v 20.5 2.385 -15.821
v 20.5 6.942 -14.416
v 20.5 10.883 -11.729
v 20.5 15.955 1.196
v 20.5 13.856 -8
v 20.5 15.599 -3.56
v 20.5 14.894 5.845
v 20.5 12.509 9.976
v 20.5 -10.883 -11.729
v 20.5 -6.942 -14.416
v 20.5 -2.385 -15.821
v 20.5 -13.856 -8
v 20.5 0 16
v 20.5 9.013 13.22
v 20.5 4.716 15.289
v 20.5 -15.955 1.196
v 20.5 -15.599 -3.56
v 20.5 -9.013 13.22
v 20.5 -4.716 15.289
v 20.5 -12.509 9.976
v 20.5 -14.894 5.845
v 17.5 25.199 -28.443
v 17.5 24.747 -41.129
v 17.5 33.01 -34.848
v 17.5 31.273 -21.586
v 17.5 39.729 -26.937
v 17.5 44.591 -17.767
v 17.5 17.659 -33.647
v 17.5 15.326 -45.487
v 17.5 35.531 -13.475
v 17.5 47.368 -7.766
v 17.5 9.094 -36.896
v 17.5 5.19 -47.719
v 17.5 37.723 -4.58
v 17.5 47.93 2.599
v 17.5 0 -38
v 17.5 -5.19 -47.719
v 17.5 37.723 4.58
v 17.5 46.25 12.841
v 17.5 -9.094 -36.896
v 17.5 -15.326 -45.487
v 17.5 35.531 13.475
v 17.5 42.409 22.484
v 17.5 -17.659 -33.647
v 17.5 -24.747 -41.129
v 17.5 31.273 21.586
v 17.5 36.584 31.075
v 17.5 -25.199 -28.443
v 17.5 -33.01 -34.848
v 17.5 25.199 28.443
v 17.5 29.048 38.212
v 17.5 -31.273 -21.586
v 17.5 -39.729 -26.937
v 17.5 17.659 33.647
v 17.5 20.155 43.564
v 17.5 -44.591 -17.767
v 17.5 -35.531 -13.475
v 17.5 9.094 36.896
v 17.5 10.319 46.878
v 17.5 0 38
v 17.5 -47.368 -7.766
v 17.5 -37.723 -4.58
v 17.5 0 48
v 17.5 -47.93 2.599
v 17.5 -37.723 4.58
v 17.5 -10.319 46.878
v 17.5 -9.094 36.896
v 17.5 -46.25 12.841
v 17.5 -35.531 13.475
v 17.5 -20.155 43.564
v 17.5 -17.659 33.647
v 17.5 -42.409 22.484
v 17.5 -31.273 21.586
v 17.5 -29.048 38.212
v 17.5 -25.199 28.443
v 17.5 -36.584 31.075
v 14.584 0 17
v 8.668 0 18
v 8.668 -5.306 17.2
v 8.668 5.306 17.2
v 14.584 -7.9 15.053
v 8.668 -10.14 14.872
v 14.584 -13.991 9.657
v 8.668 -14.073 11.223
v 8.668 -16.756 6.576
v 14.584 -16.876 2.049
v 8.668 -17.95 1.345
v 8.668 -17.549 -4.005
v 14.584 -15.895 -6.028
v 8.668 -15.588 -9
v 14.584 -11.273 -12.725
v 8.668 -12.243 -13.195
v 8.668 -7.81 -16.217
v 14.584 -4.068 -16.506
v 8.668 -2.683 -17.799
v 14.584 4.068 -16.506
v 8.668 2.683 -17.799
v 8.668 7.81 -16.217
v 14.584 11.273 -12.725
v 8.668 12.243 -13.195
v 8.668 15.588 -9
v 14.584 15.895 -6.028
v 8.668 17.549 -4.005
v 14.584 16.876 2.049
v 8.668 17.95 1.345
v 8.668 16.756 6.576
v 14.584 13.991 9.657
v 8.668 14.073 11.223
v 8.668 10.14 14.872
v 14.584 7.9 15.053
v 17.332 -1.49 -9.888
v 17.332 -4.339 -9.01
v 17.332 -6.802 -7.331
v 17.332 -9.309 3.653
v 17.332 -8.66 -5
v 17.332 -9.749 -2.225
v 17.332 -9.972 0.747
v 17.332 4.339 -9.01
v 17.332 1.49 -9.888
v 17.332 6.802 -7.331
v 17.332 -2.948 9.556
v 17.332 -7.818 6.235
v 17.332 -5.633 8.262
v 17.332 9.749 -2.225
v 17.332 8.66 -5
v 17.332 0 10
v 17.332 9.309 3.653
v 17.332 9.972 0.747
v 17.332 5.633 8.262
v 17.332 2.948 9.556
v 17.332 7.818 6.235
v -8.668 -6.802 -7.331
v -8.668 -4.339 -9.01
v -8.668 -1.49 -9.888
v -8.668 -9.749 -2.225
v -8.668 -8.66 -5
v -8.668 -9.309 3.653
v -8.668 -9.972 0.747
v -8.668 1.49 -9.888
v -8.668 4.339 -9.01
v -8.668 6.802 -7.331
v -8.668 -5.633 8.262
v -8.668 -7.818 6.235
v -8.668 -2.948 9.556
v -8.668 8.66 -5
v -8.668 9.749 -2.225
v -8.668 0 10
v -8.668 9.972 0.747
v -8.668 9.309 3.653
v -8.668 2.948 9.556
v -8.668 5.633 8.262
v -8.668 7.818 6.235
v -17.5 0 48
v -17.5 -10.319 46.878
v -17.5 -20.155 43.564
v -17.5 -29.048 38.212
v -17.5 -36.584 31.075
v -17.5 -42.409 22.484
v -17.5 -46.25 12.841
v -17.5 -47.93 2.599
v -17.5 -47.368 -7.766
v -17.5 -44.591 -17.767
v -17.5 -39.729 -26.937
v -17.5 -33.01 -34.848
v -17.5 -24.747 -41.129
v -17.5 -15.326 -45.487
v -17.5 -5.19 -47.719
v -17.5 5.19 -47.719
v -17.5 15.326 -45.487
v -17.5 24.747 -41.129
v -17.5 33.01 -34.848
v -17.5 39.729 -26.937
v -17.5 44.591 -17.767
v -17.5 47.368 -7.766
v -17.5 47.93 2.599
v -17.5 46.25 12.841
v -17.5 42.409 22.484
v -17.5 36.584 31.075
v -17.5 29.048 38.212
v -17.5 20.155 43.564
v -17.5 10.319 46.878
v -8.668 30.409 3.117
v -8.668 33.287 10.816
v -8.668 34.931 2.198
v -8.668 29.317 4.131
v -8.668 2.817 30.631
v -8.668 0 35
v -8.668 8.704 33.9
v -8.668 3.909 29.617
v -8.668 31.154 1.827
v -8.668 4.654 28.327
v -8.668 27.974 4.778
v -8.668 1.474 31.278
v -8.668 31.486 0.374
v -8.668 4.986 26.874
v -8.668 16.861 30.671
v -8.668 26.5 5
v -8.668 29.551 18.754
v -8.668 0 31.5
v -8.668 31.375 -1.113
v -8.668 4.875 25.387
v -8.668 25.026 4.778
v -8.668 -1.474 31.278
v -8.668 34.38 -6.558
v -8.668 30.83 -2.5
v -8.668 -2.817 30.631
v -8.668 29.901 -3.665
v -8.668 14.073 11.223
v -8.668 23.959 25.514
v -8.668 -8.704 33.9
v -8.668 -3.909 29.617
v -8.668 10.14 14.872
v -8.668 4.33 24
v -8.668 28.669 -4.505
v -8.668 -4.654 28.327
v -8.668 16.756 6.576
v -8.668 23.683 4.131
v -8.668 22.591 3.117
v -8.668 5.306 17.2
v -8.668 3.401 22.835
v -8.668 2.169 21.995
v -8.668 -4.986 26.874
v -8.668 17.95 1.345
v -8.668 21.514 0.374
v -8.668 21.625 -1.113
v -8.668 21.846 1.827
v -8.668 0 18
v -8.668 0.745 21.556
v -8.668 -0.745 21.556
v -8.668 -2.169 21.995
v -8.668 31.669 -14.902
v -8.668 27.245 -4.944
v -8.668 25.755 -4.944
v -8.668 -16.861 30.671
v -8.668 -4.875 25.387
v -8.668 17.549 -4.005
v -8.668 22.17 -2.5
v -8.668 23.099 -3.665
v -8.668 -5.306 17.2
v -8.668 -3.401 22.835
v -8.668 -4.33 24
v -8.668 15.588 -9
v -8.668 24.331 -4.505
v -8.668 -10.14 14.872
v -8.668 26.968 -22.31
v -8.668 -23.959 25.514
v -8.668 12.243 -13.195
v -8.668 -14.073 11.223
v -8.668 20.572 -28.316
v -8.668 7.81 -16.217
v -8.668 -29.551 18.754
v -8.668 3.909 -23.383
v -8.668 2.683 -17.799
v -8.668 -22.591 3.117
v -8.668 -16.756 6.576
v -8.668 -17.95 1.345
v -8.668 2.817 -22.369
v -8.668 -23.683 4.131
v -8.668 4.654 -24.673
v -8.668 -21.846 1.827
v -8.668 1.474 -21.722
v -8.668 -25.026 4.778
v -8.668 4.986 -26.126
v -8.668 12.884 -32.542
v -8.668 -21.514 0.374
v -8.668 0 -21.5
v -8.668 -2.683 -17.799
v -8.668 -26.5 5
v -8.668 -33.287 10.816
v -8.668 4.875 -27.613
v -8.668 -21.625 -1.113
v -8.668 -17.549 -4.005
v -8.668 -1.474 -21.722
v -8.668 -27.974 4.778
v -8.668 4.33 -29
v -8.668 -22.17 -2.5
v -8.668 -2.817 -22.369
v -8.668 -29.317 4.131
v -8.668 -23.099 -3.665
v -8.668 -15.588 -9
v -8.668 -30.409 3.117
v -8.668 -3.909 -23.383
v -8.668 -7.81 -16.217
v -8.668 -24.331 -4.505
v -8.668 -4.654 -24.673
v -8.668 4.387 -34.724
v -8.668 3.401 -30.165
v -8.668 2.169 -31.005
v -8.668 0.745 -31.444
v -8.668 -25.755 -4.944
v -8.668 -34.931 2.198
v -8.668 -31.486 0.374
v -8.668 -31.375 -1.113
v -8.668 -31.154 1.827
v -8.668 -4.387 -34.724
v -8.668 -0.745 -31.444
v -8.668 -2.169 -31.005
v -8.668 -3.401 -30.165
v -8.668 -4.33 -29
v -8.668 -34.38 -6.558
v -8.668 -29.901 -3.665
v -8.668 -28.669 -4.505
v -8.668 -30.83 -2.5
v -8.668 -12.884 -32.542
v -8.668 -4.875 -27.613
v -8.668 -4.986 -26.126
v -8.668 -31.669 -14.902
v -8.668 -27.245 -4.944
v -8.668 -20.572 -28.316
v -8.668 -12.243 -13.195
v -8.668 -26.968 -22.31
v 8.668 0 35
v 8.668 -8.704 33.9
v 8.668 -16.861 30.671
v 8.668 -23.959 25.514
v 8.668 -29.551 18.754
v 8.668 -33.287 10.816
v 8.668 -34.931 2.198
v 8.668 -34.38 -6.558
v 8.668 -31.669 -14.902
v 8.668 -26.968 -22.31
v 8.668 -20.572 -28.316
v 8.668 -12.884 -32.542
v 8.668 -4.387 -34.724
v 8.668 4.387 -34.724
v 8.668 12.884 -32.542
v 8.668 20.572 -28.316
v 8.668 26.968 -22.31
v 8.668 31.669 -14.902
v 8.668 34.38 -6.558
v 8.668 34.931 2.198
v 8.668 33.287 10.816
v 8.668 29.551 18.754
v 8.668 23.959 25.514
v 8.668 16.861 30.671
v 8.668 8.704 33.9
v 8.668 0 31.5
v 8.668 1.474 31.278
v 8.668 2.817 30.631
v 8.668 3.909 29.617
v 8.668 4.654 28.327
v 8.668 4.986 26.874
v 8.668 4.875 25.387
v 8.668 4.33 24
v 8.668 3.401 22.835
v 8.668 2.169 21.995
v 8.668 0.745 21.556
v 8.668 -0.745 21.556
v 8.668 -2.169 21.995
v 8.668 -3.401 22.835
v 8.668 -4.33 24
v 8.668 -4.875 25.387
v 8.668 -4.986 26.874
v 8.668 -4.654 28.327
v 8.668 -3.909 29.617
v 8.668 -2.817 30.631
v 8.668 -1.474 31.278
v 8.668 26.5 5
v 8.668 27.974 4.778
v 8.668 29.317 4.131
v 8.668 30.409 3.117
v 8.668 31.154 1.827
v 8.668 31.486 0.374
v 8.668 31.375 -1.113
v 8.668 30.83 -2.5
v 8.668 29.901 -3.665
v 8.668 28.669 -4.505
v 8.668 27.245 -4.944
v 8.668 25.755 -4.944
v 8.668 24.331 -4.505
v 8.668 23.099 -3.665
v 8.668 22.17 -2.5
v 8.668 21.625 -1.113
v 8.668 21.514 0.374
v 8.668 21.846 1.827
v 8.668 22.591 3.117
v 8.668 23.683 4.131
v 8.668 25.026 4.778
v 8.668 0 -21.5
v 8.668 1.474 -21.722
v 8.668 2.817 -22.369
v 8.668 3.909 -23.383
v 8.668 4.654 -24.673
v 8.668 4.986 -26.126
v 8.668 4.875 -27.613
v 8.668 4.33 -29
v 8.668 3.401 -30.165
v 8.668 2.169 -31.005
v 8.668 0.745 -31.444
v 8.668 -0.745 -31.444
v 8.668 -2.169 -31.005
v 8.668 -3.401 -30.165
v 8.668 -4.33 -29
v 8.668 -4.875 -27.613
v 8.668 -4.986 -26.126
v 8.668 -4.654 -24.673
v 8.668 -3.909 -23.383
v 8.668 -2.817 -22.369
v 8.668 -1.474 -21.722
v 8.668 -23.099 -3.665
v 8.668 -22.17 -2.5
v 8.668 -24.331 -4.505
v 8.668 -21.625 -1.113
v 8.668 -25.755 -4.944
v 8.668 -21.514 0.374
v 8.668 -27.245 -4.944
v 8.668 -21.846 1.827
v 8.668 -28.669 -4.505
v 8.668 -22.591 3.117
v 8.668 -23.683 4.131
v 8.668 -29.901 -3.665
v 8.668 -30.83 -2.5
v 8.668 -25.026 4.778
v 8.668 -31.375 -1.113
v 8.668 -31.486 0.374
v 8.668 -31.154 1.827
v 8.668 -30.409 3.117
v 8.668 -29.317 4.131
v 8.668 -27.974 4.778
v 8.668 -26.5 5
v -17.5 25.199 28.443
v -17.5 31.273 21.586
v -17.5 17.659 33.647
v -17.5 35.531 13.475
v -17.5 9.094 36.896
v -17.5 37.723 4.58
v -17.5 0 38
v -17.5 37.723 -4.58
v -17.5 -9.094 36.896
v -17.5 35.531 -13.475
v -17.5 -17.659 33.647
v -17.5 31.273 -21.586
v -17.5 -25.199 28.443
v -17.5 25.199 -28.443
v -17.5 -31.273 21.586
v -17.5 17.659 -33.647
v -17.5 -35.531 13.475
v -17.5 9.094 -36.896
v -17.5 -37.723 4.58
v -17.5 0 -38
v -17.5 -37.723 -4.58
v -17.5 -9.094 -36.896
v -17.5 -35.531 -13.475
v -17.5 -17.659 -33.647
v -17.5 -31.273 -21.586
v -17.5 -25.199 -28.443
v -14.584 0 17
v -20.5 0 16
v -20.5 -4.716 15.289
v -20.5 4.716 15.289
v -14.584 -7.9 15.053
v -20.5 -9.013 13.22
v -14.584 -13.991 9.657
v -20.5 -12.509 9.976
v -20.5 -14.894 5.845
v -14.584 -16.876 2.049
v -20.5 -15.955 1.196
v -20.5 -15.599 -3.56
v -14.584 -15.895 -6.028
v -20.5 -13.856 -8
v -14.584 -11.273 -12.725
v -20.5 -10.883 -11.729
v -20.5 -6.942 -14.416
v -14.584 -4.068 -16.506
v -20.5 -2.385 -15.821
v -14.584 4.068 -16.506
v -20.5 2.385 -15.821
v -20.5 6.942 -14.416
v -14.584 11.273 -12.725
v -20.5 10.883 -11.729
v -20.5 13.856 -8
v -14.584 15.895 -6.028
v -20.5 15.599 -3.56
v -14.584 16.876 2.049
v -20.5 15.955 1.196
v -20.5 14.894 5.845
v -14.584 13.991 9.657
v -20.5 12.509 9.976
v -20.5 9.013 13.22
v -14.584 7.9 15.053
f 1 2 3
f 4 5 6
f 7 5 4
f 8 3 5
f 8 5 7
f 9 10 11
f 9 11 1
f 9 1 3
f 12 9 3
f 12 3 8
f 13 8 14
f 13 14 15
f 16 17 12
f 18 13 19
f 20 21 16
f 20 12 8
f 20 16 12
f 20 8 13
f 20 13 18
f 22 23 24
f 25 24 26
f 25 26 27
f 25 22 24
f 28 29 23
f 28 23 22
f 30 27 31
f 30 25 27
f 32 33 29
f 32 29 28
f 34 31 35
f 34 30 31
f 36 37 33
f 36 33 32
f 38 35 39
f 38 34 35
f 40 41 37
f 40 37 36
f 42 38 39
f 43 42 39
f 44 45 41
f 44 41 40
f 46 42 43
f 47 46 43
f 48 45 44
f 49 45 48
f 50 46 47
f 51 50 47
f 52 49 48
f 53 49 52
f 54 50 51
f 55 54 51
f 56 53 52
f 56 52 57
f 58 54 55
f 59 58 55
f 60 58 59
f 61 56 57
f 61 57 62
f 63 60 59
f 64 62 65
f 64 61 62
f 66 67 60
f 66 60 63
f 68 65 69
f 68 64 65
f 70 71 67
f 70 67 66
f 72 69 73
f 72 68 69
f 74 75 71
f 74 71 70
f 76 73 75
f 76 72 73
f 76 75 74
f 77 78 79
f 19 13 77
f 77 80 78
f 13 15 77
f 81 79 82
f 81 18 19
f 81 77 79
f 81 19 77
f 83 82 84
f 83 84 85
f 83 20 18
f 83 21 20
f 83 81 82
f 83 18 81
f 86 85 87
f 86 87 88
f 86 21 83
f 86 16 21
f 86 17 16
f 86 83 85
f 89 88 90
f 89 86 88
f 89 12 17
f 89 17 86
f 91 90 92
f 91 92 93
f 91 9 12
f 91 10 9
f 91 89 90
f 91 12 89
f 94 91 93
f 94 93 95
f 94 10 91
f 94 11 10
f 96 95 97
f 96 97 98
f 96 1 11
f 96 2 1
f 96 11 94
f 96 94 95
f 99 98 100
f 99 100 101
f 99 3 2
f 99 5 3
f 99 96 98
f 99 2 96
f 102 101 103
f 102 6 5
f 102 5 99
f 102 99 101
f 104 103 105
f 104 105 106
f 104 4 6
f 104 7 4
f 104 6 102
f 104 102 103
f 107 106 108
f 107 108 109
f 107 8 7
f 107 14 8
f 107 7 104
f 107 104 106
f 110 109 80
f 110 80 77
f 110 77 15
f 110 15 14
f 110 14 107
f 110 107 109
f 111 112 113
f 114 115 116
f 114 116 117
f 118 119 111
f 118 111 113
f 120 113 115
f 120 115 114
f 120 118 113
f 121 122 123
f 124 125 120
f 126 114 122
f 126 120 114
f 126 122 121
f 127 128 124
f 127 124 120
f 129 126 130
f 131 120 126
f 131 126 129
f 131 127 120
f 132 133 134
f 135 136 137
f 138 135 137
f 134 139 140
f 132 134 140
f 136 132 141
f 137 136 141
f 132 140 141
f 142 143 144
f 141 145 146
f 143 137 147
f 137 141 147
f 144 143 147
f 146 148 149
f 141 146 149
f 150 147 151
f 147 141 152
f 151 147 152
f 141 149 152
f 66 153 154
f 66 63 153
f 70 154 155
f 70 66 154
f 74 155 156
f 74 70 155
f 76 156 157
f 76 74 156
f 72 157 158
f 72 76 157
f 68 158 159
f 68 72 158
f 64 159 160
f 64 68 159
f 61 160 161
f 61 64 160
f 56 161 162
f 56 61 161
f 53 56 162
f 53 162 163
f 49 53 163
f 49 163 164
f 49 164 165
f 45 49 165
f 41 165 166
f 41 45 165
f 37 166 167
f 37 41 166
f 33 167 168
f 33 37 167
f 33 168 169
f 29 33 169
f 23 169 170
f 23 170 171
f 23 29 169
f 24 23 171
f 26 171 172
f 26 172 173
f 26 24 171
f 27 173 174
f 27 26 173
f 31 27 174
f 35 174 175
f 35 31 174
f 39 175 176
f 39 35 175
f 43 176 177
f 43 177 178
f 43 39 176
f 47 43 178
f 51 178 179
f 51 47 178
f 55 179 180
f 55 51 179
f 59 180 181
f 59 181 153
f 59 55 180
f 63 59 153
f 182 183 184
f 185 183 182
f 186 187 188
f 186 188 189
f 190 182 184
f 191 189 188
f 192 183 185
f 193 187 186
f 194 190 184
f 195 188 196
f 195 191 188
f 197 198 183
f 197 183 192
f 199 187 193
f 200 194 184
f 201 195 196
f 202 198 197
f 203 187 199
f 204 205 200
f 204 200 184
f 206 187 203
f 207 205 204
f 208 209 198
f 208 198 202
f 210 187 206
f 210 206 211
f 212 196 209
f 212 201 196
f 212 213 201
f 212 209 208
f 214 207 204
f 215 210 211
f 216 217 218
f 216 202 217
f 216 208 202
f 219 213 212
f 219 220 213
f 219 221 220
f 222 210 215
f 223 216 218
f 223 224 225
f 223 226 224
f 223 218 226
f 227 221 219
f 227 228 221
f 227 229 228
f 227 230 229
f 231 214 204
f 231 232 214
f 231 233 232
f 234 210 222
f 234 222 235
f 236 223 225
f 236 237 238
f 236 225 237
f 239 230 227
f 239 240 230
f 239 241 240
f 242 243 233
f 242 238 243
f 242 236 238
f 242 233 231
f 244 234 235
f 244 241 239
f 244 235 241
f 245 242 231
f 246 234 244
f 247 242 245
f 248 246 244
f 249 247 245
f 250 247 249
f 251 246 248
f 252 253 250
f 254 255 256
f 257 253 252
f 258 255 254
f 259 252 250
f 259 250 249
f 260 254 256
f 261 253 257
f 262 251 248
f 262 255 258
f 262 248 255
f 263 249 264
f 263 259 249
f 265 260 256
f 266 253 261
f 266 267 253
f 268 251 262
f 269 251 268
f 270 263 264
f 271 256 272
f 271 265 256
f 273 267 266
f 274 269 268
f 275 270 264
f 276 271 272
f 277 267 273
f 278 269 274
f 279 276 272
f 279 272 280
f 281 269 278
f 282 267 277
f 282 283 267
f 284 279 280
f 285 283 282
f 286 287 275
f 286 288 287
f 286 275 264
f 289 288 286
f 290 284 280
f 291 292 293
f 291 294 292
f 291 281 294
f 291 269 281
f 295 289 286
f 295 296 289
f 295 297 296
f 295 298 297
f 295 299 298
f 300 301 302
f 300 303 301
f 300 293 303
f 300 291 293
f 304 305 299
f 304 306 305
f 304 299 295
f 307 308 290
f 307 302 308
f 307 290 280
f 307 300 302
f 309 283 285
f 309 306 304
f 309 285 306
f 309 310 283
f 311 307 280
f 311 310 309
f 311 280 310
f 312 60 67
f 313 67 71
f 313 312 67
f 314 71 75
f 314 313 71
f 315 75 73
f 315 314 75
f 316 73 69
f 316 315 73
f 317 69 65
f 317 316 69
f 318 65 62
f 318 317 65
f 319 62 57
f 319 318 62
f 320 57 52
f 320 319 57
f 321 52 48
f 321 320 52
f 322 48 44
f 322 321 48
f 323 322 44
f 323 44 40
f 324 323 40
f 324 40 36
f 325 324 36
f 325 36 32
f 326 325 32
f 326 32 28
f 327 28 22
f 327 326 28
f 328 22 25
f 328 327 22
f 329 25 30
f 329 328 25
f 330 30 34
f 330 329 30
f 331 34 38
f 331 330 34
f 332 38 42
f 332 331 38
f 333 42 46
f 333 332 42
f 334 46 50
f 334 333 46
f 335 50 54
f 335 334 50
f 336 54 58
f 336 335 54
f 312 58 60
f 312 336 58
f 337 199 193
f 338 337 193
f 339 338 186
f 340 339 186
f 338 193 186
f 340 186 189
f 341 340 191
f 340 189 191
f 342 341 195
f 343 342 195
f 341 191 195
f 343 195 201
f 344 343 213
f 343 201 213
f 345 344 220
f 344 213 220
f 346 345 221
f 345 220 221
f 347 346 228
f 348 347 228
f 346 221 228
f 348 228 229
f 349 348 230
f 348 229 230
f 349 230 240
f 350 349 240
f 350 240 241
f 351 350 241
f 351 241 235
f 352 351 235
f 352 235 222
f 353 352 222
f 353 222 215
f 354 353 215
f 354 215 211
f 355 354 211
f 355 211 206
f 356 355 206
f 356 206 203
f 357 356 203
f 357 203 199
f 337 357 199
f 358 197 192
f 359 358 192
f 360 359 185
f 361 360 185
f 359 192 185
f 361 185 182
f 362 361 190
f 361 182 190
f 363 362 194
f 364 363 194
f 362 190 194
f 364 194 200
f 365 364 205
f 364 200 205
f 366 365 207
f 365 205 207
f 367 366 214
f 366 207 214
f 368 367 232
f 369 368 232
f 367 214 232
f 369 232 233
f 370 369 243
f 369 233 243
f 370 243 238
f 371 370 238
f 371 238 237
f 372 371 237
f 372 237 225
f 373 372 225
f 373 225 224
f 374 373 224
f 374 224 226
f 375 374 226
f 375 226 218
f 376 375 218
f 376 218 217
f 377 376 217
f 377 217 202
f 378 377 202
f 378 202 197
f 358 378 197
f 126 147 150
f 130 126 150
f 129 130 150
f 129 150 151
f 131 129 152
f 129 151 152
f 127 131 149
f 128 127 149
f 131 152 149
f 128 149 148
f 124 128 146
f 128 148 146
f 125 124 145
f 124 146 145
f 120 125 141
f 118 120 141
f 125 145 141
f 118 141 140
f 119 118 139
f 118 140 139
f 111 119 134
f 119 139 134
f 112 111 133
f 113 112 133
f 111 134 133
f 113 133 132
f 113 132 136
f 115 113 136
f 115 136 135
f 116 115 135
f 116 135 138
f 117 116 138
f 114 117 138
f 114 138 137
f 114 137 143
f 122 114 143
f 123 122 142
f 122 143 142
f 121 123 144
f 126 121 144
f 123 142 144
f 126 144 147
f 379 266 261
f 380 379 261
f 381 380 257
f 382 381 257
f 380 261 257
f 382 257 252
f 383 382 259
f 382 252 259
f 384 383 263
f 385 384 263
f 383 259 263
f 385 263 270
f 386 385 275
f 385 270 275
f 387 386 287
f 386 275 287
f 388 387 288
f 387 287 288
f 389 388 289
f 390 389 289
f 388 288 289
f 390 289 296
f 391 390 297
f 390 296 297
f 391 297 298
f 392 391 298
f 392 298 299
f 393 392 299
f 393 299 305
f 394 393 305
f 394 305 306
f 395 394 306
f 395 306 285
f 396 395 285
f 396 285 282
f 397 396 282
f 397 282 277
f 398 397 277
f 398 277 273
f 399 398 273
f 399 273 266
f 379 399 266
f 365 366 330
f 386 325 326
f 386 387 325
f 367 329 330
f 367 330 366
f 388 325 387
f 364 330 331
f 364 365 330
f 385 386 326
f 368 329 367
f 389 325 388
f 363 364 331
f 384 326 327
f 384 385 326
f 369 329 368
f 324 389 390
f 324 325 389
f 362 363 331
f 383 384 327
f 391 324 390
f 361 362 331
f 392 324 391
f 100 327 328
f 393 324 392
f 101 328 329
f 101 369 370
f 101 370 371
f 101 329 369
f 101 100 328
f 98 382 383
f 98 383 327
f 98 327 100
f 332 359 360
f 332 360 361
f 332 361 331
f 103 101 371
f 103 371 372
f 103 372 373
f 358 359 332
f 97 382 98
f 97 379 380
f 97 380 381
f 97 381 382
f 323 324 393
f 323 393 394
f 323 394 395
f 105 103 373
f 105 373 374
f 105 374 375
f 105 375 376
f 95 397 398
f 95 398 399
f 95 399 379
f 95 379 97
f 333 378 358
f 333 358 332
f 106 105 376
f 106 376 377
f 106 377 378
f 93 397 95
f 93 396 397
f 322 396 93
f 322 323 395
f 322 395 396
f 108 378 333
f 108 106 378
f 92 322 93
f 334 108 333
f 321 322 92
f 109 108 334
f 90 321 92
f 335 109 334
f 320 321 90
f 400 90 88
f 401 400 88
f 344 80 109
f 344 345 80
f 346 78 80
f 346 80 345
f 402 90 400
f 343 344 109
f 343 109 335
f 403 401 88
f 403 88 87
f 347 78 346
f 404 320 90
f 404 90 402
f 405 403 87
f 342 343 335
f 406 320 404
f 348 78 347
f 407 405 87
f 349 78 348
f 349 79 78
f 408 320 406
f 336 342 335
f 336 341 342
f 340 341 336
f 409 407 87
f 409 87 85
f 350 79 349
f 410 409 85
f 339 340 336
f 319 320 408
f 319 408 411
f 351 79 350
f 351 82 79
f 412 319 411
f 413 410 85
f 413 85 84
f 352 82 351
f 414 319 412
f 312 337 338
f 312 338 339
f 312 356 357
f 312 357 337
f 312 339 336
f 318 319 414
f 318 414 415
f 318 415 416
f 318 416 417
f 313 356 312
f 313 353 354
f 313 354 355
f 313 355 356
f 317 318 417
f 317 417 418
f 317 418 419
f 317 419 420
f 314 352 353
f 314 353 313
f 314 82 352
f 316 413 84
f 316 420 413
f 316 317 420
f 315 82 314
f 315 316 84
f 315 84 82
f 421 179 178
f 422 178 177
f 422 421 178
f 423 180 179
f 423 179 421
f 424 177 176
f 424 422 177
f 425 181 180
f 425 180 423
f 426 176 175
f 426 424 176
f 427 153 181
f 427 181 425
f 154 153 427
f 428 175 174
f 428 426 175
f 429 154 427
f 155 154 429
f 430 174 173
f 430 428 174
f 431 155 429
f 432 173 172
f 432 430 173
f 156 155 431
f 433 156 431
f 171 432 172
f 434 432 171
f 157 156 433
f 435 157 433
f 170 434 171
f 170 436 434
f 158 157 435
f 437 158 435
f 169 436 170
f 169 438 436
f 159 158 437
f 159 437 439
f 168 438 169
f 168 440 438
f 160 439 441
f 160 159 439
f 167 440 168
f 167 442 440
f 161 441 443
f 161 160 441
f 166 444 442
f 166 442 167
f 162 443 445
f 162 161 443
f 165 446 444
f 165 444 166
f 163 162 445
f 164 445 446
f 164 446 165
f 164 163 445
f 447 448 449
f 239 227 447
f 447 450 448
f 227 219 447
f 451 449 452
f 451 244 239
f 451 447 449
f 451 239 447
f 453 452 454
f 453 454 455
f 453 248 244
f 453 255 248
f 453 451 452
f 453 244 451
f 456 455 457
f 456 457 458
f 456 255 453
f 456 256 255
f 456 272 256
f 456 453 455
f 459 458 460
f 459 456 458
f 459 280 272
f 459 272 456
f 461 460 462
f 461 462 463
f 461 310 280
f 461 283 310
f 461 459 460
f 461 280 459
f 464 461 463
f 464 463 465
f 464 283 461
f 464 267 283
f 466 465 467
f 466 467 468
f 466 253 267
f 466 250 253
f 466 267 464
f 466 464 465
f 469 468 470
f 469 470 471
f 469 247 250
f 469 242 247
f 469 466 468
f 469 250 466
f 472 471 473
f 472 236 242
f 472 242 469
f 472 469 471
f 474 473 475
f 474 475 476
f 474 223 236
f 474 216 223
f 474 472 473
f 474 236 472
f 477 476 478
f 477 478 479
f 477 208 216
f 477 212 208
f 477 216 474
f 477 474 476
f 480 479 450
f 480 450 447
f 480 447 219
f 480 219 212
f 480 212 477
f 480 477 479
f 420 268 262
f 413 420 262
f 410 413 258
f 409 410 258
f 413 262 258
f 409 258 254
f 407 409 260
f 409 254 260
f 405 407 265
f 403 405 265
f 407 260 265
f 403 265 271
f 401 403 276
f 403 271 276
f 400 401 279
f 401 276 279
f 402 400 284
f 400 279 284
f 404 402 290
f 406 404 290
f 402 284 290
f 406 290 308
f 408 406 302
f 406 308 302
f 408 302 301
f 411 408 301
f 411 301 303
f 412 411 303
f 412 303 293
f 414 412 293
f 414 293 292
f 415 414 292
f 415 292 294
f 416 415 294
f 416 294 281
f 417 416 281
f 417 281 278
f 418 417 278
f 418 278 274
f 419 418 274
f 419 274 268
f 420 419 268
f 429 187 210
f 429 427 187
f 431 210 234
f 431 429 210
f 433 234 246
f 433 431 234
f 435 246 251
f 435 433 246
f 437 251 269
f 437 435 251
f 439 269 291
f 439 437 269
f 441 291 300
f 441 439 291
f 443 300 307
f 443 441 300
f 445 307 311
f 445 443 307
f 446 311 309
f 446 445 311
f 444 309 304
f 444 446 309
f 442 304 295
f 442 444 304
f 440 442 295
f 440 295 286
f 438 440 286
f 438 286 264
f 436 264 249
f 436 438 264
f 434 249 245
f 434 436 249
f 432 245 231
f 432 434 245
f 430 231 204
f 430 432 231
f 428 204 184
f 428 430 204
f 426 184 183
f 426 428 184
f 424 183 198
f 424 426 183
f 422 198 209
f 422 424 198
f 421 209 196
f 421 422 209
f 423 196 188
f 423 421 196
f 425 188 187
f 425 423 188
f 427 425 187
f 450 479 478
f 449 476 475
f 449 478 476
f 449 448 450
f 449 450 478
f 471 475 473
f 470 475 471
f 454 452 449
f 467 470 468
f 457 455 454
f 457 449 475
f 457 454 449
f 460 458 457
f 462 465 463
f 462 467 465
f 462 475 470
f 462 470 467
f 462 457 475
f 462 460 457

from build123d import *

# Parameters (mm, degrees)
SKETCH2_R          = 5
SKETCH2_R_2        = 10
CUT_EXTRUDE1_DEPTH = 26


with BuildPart() as part:
    # Sketch1 → Revolve1 (revolve)
    with BuildSketch(Plane.XY, mode=Mode.PRIVATE) as revolve1_sk:
        Polygon((-20.5, 0), (-20.5, 16), (-8.667840434, 18), (-8.667840434, 35), (-17.5, 38), (-17.5, 48), (17.5, 48), (17.5, 38), (8.667840434, 35), (8.667840434, 18), (20.5, 16), (20.5, 0), align=None)
    revolve(revolve1_sk.sketch.rotate(Axis((-20.5, 0, 0), (1, 0, 0)), 90), axis=Axis((-20.5, 0, 0), (1, 0, 0)))

    # Sketch2 → Cut-Extrude1 (cut)
    with BuildSketch(Plane.ZY.offset(8.667840434)):
        with Locations((0, 26.5)):
            Circle(SKETCH2_R)
        with Locations((26.5, 0)):
            Circle(SKETCH2_R)
        with Locations((0, -26.5)):
            Circle(SKETCH2_R)
        with Locations((-26.5, 0)):
            Circle(SKETCH2_R)
        Circle(SKETCH2_R_2)
    extrude(amount=-CUT_EXTRUDE1_DEPTH, mode=Mode.SUBTRACT)


solid = part.part
